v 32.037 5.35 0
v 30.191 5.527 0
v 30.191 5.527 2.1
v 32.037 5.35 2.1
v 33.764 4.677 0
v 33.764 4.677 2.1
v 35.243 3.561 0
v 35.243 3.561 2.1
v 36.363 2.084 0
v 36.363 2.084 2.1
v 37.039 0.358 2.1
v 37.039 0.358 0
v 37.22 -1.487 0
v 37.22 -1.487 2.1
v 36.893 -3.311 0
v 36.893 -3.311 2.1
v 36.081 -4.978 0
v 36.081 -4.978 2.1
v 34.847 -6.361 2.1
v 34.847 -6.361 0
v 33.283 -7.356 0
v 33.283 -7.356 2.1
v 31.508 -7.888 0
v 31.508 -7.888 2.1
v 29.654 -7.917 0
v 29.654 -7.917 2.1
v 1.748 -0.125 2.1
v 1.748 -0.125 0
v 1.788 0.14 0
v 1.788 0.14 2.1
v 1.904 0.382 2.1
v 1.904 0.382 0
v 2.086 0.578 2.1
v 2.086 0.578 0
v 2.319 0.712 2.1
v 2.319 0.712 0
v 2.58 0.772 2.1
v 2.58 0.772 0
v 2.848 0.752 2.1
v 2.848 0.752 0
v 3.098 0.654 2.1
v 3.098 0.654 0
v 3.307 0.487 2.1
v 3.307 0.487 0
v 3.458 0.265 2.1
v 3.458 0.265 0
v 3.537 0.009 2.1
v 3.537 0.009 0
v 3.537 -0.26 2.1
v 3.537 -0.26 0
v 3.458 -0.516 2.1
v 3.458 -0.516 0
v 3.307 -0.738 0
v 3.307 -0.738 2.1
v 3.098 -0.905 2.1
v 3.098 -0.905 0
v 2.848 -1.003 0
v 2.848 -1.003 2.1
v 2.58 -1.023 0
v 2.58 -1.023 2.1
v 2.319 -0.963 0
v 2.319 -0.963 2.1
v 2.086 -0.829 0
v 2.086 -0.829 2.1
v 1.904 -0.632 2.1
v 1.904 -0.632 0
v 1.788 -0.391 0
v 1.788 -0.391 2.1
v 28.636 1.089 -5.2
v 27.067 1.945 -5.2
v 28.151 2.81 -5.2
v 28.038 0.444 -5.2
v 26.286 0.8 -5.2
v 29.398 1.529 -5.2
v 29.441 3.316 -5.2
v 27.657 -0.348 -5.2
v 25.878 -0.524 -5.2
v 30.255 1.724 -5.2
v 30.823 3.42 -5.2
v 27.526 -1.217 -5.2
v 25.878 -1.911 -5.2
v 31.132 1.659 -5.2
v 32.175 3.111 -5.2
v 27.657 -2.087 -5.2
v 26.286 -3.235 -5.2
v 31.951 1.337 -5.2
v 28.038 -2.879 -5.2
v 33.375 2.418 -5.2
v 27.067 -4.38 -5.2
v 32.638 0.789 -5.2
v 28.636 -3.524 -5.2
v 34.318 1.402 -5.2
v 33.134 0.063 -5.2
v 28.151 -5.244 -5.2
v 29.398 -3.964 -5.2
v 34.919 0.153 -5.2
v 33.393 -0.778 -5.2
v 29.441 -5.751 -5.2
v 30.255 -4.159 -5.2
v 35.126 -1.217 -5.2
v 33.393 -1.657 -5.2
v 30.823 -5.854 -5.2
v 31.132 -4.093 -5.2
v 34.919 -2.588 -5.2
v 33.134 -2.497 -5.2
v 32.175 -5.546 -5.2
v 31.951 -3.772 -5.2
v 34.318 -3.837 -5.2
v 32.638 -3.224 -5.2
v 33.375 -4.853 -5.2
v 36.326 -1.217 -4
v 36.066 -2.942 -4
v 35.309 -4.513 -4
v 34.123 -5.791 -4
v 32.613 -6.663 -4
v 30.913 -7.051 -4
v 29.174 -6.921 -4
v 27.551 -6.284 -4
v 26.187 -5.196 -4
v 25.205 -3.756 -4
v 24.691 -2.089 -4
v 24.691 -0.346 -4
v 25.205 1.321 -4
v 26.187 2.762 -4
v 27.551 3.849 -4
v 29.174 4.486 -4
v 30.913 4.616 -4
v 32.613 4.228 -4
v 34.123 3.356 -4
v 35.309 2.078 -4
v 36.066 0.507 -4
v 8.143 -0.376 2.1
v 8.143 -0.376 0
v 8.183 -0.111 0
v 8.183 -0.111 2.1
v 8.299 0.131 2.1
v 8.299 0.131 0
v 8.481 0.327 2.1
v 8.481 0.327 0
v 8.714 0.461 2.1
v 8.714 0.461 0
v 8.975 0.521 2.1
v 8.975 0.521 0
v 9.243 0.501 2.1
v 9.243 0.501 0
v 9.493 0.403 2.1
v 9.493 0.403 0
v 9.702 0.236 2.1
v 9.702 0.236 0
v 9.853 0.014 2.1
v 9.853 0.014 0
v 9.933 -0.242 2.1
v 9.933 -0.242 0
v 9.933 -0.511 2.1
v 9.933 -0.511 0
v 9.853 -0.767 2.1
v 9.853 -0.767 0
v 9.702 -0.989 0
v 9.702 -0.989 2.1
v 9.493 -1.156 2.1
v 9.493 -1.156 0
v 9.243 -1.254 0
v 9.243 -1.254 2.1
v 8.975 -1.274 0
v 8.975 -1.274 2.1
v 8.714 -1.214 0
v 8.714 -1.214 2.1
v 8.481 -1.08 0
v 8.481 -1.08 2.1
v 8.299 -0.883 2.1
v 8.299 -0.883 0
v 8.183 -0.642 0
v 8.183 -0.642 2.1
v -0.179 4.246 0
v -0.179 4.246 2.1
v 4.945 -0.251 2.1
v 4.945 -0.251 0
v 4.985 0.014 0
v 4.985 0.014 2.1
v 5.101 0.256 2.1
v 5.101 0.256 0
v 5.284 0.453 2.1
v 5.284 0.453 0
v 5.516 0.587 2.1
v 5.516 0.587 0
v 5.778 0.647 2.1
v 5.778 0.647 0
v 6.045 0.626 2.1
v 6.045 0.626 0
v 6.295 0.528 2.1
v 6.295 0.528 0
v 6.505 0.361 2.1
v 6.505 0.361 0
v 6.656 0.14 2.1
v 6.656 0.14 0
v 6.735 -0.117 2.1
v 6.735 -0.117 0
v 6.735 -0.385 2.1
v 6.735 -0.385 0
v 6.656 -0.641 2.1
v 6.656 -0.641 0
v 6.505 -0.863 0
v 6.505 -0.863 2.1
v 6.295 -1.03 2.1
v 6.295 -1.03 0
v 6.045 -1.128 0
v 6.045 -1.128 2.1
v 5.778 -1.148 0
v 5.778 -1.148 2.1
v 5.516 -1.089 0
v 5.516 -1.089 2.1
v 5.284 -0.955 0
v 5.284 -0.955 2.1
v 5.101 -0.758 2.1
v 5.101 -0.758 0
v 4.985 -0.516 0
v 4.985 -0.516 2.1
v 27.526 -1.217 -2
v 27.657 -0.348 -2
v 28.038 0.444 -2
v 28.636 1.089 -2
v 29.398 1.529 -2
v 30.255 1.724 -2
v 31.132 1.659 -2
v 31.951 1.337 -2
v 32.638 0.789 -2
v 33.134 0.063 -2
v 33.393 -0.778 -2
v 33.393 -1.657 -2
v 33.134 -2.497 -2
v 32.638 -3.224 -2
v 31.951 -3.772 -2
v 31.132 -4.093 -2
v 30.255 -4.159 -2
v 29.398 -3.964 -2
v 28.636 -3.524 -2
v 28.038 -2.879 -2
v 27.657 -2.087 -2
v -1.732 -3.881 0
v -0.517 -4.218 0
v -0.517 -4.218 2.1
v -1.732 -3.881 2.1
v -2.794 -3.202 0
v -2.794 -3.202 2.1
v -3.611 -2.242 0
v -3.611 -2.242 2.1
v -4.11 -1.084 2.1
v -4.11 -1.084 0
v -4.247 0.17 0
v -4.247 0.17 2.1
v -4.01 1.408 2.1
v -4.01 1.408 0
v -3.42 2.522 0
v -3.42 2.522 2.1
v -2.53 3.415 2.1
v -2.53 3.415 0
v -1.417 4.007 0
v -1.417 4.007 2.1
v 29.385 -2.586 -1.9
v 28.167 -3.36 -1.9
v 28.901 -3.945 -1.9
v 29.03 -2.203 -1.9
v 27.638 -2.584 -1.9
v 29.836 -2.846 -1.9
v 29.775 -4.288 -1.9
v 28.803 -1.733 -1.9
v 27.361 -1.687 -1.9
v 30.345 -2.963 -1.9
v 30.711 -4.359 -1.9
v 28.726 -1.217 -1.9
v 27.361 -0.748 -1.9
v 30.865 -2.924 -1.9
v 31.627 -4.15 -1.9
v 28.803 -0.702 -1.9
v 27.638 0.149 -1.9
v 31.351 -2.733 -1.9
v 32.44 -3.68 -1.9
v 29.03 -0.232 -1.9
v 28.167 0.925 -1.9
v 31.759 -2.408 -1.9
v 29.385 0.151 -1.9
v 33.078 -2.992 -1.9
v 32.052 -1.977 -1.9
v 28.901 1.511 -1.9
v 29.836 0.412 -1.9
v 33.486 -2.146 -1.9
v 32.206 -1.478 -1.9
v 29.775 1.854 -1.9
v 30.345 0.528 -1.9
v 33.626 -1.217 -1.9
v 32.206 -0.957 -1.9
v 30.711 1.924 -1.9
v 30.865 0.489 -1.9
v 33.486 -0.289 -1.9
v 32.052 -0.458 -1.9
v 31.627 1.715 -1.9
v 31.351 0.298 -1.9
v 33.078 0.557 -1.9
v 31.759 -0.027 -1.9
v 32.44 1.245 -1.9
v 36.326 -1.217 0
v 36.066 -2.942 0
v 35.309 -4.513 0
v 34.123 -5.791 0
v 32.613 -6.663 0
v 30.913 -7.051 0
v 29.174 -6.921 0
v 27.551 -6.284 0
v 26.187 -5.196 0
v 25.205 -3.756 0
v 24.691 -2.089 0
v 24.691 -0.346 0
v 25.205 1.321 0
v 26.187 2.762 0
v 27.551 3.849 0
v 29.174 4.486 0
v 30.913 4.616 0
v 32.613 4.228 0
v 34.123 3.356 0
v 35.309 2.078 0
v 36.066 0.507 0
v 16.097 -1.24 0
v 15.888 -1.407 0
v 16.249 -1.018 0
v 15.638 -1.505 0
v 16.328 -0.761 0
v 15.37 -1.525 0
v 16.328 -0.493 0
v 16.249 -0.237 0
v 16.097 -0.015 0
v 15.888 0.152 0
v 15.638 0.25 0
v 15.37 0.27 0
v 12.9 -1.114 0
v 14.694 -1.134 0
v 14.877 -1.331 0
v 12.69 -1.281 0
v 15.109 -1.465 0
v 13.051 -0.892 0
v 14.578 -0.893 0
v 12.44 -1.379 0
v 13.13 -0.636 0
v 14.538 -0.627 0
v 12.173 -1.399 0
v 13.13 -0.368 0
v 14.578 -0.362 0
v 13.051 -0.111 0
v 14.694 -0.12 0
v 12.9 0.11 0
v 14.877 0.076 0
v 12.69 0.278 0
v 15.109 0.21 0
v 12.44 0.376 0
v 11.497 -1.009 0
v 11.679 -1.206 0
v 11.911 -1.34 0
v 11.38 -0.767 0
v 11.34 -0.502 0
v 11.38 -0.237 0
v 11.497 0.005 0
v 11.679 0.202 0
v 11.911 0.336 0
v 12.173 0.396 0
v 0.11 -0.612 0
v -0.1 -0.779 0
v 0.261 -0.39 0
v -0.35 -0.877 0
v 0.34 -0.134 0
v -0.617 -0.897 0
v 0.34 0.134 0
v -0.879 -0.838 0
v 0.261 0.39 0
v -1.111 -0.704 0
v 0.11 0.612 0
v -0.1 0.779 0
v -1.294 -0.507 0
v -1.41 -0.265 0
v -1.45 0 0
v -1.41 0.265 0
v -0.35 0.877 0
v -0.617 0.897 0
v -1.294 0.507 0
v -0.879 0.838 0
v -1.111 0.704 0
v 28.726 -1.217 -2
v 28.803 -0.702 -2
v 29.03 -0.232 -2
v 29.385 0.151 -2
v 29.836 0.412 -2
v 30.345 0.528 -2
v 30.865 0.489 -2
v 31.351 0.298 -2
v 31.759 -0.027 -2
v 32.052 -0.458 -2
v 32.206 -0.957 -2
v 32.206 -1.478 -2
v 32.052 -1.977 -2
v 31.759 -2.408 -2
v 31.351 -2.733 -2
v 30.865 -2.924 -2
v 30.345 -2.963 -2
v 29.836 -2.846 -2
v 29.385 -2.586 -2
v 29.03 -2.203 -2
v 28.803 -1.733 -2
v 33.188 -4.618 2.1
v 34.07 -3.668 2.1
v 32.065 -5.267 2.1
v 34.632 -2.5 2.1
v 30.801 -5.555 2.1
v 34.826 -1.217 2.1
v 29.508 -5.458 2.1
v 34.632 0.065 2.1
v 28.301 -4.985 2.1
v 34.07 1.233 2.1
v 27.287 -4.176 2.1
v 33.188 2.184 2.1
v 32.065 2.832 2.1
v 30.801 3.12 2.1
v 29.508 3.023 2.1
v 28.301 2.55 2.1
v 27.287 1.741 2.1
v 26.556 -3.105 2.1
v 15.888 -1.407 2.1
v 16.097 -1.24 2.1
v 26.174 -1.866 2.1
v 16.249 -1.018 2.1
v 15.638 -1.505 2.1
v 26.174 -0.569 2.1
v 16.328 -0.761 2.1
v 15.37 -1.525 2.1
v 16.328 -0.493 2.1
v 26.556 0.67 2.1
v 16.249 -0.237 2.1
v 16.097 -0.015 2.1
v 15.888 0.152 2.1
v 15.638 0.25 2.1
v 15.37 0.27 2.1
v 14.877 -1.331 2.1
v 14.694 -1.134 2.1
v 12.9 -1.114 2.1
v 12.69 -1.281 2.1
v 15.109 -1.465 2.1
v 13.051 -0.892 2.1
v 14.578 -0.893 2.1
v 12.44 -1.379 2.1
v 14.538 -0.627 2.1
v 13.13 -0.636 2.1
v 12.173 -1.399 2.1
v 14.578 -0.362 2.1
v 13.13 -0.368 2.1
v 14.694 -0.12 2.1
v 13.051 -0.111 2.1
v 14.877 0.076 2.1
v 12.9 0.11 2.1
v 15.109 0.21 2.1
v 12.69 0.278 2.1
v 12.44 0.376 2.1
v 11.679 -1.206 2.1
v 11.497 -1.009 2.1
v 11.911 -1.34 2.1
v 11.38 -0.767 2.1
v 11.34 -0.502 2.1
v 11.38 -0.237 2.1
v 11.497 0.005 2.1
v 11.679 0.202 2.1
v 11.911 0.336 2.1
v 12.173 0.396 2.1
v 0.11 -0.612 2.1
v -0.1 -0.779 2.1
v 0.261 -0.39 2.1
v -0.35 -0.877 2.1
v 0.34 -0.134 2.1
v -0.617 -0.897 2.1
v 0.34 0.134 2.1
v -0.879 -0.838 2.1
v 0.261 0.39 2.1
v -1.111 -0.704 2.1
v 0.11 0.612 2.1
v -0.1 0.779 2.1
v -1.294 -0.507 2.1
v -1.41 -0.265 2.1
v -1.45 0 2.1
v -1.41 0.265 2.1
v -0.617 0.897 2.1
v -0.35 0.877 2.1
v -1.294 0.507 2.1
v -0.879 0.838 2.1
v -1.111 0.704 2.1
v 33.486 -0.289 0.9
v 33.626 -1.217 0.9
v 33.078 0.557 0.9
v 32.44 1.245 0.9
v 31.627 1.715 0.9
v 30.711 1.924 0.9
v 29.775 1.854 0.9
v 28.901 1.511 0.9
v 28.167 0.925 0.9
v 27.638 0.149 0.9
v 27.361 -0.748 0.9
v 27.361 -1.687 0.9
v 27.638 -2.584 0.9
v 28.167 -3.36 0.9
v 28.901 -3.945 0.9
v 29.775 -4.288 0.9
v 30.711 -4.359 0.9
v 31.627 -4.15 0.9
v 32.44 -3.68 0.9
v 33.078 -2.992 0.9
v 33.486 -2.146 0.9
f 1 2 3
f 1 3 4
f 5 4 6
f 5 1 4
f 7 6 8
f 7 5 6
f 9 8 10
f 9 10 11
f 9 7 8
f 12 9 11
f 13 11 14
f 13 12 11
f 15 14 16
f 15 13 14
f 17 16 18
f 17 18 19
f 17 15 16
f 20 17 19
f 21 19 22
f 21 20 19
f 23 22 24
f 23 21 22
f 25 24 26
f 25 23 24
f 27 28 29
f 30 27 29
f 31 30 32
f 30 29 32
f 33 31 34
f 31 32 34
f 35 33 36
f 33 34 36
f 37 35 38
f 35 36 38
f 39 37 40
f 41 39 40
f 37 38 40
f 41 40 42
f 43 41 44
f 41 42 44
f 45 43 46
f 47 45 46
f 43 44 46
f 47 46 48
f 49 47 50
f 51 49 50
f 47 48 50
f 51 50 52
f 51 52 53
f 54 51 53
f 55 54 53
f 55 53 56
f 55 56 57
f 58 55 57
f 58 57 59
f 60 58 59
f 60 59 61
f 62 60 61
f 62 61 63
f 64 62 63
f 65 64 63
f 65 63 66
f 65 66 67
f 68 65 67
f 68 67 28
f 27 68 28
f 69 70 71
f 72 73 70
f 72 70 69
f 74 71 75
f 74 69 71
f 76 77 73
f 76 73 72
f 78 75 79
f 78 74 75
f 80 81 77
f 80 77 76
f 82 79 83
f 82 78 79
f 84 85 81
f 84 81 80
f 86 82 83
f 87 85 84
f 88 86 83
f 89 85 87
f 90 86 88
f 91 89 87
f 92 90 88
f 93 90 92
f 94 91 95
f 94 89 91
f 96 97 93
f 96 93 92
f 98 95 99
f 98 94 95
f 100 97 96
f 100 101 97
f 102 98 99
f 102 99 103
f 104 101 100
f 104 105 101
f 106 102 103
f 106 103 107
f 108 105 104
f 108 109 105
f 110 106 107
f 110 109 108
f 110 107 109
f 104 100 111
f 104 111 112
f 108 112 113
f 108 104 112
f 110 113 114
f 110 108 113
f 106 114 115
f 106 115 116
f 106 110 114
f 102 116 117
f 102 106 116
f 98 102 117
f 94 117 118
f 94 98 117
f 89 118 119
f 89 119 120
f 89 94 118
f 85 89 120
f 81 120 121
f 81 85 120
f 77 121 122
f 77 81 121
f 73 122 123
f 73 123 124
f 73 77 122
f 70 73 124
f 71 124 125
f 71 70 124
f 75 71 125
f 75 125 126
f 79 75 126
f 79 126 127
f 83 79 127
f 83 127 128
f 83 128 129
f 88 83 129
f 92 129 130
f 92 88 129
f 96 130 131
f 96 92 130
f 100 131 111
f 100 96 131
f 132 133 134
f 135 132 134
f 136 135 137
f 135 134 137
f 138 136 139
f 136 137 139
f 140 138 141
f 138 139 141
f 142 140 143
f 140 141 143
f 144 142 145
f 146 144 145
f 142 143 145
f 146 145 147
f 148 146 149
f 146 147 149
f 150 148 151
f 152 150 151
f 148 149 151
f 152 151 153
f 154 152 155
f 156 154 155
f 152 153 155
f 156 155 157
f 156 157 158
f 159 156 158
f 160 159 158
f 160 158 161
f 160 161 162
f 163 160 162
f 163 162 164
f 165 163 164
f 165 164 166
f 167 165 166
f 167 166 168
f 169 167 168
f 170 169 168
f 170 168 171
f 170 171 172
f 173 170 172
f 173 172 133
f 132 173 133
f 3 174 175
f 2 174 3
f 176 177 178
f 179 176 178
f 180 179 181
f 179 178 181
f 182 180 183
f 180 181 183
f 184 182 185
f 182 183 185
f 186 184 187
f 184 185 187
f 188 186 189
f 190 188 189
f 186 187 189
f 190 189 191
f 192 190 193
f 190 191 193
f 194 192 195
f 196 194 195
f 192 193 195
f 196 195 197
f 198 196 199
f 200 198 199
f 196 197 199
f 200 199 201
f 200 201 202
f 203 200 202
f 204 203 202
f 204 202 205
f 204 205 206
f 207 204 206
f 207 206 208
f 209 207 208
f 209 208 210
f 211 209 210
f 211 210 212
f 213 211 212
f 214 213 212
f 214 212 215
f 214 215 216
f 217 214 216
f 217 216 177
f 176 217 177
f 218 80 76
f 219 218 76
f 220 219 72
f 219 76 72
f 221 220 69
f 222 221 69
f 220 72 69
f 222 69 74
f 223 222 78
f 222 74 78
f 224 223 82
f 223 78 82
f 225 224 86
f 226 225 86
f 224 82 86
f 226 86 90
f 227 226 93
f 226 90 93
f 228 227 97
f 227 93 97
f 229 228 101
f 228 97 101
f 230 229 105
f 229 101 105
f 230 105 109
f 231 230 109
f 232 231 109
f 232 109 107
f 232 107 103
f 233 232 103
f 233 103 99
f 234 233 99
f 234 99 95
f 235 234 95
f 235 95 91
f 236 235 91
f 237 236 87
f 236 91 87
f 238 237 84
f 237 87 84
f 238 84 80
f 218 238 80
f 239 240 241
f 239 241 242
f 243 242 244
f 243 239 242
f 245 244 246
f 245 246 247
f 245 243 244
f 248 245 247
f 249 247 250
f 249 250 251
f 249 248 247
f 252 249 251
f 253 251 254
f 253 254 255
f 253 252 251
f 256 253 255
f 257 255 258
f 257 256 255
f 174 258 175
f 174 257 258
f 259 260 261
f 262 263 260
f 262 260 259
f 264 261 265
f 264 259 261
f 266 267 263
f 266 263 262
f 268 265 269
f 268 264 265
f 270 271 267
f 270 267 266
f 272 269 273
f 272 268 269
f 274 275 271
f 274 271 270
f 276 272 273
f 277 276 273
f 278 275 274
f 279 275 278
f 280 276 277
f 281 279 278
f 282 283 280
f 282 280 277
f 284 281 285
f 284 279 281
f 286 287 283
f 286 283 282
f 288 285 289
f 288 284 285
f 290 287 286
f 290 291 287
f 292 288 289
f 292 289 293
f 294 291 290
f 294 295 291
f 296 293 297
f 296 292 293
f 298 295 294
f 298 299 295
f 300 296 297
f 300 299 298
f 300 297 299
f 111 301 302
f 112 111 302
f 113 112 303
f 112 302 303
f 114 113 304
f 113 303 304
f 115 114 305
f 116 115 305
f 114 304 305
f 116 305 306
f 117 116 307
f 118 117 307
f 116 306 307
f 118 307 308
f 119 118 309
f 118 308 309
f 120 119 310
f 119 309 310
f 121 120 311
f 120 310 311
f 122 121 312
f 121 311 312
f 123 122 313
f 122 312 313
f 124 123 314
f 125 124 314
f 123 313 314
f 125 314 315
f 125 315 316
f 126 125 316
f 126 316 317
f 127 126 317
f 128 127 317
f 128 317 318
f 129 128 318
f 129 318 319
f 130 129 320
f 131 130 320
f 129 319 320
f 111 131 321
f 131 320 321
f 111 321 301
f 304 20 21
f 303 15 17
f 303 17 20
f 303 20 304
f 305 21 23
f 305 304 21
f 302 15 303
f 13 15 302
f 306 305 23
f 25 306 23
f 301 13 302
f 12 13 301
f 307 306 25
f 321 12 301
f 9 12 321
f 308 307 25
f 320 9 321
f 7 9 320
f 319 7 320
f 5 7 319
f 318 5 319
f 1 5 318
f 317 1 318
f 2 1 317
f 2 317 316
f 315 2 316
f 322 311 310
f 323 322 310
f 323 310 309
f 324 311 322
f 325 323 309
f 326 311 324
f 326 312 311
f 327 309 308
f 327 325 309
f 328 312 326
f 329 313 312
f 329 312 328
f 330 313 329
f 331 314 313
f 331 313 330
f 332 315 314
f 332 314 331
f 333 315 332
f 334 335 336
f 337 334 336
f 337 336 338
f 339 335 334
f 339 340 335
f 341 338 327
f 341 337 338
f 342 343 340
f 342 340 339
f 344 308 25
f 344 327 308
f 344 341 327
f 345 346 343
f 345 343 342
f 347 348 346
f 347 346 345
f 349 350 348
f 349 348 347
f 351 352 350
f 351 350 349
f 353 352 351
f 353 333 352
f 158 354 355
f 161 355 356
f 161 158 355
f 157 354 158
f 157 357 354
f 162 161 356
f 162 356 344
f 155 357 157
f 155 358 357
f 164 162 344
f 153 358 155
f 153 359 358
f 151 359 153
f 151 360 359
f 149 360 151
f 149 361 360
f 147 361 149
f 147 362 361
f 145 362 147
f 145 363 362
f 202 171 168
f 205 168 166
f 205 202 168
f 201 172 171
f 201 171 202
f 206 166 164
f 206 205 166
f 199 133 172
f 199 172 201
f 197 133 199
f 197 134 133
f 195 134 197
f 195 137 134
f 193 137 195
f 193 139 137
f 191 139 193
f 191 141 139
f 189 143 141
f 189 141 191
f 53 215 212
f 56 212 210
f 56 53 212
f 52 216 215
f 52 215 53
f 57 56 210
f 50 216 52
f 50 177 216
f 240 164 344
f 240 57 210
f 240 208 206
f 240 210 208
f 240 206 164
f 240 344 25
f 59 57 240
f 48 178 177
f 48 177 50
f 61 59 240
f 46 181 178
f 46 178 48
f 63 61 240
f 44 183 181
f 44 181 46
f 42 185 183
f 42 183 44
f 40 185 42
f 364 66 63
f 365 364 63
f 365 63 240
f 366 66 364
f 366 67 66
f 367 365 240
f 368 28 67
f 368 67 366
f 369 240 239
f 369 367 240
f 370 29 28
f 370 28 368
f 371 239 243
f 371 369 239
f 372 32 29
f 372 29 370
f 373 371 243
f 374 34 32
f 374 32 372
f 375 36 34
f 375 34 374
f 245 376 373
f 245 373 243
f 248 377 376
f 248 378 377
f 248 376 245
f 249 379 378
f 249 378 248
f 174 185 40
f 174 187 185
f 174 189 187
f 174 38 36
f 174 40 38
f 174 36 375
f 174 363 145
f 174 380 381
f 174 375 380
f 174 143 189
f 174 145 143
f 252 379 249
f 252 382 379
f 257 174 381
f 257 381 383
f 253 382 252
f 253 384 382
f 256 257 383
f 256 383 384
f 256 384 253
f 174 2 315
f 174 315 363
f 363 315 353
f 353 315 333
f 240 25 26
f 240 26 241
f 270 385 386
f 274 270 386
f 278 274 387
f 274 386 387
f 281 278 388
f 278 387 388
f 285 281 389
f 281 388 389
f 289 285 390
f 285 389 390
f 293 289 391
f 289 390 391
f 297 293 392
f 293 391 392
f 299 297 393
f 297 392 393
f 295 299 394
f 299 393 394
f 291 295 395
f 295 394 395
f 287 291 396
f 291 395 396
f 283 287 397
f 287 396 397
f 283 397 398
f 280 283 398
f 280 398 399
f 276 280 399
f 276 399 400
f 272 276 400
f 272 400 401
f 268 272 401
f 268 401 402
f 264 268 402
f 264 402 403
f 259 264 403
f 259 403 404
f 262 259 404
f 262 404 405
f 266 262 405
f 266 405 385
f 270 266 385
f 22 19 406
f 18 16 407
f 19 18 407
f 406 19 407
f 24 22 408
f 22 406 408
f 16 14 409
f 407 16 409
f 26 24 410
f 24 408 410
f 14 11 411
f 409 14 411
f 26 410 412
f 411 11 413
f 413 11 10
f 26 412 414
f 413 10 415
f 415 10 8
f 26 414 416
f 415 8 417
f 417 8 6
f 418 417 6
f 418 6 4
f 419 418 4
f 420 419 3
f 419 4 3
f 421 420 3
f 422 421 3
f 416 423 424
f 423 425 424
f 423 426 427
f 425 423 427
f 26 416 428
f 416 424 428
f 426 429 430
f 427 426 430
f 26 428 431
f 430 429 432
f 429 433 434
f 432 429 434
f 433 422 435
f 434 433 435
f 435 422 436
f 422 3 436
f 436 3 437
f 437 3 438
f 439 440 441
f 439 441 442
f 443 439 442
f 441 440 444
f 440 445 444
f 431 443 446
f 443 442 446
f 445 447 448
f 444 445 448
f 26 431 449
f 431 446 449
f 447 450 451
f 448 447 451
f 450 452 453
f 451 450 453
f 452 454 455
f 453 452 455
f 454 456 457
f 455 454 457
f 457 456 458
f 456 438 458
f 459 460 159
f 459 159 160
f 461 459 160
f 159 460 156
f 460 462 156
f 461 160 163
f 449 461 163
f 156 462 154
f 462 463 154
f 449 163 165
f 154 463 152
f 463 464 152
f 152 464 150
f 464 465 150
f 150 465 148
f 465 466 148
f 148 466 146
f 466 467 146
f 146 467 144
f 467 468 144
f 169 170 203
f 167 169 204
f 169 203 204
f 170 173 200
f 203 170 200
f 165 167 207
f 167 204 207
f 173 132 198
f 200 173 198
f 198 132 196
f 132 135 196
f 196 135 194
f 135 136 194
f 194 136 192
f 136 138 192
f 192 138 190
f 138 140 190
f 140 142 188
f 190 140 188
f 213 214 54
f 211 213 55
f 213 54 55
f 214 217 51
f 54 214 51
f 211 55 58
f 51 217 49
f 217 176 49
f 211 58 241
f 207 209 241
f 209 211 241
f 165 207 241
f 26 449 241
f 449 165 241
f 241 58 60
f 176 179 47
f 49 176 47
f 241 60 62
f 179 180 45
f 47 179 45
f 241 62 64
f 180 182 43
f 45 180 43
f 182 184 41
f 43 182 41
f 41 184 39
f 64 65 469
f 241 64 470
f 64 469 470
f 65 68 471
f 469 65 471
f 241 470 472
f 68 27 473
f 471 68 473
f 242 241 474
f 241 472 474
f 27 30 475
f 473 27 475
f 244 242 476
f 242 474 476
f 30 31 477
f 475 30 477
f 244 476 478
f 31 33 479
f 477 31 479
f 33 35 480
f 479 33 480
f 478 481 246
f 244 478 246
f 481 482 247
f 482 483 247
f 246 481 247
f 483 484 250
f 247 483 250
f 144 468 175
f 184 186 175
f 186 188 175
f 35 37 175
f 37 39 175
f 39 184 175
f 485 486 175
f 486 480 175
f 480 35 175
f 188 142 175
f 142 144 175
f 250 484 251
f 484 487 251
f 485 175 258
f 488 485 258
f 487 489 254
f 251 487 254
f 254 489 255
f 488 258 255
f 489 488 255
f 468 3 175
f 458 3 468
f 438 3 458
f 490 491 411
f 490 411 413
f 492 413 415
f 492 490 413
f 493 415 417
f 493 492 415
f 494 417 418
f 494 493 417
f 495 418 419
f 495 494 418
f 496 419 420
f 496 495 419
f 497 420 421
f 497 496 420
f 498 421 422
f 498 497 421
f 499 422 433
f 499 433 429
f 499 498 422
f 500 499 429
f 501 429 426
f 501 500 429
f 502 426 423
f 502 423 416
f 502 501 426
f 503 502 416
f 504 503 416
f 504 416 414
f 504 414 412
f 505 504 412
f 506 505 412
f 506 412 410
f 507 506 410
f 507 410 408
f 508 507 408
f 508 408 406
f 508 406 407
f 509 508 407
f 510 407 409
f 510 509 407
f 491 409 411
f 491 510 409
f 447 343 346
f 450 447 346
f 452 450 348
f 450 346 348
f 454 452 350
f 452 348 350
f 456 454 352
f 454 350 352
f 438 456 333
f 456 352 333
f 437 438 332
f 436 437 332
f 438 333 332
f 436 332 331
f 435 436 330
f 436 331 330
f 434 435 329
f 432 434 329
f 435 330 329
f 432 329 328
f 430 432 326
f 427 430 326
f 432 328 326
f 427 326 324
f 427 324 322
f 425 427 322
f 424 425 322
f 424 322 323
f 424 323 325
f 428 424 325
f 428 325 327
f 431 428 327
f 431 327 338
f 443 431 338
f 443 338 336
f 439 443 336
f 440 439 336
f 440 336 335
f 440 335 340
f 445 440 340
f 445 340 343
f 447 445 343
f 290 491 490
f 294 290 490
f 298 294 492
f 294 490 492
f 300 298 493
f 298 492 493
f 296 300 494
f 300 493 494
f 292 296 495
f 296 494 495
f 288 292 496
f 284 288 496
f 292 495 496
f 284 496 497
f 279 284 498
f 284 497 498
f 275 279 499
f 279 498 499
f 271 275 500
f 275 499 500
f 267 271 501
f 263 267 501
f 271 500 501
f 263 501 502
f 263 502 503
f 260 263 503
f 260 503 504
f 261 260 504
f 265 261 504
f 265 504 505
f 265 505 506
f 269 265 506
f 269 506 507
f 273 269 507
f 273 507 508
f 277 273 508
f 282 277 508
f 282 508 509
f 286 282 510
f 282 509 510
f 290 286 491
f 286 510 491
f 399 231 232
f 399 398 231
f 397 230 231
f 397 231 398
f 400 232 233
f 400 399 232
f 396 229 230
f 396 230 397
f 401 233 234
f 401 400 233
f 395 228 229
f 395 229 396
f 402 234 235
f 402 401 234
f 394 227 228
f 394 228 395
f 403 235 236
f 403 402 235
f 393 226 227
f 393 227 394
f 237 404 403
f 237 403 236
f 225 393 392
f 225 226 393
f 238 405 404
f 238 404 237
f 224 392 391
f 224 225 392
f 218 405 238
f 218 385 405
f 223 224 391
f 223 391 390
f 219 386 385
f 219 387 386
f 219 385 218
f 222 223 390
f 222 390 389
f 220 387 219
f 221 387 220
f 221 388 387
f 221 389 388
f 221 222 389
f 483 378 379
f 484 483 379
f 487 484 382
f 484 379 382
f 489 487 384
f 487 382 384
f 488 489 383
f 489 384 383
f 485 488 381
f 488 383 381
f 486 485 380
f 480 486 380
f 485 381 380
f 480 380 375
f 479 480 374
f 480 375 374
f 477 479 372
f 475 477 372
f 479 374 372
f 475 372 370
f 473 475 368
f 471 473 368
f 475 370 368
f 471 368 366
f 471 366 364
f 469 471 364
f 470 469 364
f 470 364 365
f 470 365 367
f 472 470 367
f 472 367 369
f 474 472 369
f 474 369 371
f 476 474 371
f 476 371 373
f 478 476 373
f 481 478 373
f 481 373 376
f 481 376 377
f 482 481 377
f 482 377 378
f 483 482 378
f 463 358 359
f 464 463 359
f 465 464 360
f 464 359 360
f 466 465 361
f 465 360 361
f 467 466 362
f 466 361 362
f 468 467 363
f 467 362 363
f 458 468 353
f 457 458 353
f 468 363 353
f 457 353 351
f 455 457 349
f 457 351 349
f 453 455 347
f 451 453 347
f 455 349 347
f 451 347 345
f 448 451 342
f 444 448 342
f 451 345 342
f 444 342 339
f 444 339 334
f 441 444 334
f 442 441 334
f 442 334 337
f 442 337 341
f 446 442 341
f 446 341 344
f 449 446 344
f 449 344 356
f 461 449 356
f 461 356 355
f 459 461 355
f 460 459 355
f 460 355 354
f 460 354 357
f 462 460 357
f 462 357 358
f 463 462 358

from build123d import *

# Parameters (mm, degrees)
EXTRUSION1_DEPTH           = 2.1
ESQUISSE2_R                = 5.85
EXTRUSION2_DEPTH           = 5.2
ESQUISSE3_R                = 1.75
EXTRUSION3_DEPTH           = 39.762384708
ESQUISSE4_R                = 3.15
EXTRUSION4_DEPTH           = 4
ESQUISSE5_R                = 2.95
EXTRUSION5_DEPTH           = 3.2
CHANFREIN2_SIZE            = 1.2
D_GAGEMENT_M21_D           = 1.8
R_P_TITION_LIN_AIRE1_COUNT = 6
R_P_TITION_LIN_AIRE1_PITCH = 3.2


with BuildPart() as part:
    # Esquisse1 → Extrusion1 (new body)
    with BuildSketch(Plane.XY):
        with BuildLine():
            Line((-0.179008677, 4.246228432), (30.191384159, 5.526556123))
            ThreePointArc((30.191384159, 5.526556123), (37.220312431, -1.486890222), (29.654324486, -7.917293686))
            Line((29.654324486, -7.917293686), (-0.51715736, -4.218417744))
            ThreePointArc((-0.51715736, -4.218417744), (-4.246612828, 0.169645193), (-0.179008677, 4.246228432))
        make_face()
    extrude(amount=EXTRUSION1_DEPTH)

    # Esquisse2 → Extrusion2 (add)
    with BuildSketch(Plane(origin=(0, 0, 0), x_dir=(-1, 0, 0), z_dir=(0, 0, -1))):
        with Locations((-30.475692058, -1.217453739)):
            Circle(ESQUISSE2_R)
    extrude(amount=EXTRUSION2_DEPTH)

    # Esquisse3 → Extrusion3 (cut, through all)
    with BuildSketch(Plane(origin=(0, 0, -5.2), x_dir=(-1, 0, 0), z_dir=(0, 0, -1))):
        with Locations((-30.475692058, -1.217453739)):
            Circle(ESQUISSE3_R)
    extrude(amount=-EXTRUSION3_DEPTH, mode=Mode.SUBTRACT)

    # Esquisse4 → Extrusion4 (cut)
    with BuildSketch(Plane.XY.offset(2.1)):
        with Locations((30.475692058, -1.217453739)):
            Circle(ESQUISSE4_R)
    extrude(amount=-EXTRUSION4_DEPTH, mode=Mode.SUBTRACT)

    # Esquisse5 → Extrusion5 (cut)
    with BuildSketch(Plane(origin=(0, 0, -5.2), x_dir=(-1, 0, 0), z_dir=(0, 0, -1))):
        with Locations((-30.475692058, -1.217453739)):
            Circle(ESQUISSE5_R)
    extrude(amount=-EXTRUSION5_DEPTH, mode=Mode.SUBTRACT)

    # Chanfrein2
    chanfrein2_edges = [part.edges().sort_by_distance(p)[0] for p in [
        (27.325692058, -1.217453739, 2.1),
        (36.325692058, -1.217453739, -5.2),
    ]]
    chamfer(chanfrein2_edges, length=CHANFREIN2_SIZE)

    # Dégagement M21 (through all)
    with Locations(Plane(origin=(-0.55, 0, 2.1), x_dir=(1, 0, 0), z_dir=(0, 0, 1))):
        with Locations((0, 0)):
            d_gagement_m21 = Hole(D_GAGEMENT_M21_D / 2)

    # Répétition linéaire1: Dégagement M21 ×6
    with Locations(*[Vector(0.9992309921094119, -0.0392100039280862, 0) * (i * R_P_TITION_LIN_AIRE1_PITCH) for i in range(1, R_P_TITION_LIN_AIRE1_COUNT)]):
        add(d_gagement_m21, mode=Mode.SUBTRACT)


solid = part.part
